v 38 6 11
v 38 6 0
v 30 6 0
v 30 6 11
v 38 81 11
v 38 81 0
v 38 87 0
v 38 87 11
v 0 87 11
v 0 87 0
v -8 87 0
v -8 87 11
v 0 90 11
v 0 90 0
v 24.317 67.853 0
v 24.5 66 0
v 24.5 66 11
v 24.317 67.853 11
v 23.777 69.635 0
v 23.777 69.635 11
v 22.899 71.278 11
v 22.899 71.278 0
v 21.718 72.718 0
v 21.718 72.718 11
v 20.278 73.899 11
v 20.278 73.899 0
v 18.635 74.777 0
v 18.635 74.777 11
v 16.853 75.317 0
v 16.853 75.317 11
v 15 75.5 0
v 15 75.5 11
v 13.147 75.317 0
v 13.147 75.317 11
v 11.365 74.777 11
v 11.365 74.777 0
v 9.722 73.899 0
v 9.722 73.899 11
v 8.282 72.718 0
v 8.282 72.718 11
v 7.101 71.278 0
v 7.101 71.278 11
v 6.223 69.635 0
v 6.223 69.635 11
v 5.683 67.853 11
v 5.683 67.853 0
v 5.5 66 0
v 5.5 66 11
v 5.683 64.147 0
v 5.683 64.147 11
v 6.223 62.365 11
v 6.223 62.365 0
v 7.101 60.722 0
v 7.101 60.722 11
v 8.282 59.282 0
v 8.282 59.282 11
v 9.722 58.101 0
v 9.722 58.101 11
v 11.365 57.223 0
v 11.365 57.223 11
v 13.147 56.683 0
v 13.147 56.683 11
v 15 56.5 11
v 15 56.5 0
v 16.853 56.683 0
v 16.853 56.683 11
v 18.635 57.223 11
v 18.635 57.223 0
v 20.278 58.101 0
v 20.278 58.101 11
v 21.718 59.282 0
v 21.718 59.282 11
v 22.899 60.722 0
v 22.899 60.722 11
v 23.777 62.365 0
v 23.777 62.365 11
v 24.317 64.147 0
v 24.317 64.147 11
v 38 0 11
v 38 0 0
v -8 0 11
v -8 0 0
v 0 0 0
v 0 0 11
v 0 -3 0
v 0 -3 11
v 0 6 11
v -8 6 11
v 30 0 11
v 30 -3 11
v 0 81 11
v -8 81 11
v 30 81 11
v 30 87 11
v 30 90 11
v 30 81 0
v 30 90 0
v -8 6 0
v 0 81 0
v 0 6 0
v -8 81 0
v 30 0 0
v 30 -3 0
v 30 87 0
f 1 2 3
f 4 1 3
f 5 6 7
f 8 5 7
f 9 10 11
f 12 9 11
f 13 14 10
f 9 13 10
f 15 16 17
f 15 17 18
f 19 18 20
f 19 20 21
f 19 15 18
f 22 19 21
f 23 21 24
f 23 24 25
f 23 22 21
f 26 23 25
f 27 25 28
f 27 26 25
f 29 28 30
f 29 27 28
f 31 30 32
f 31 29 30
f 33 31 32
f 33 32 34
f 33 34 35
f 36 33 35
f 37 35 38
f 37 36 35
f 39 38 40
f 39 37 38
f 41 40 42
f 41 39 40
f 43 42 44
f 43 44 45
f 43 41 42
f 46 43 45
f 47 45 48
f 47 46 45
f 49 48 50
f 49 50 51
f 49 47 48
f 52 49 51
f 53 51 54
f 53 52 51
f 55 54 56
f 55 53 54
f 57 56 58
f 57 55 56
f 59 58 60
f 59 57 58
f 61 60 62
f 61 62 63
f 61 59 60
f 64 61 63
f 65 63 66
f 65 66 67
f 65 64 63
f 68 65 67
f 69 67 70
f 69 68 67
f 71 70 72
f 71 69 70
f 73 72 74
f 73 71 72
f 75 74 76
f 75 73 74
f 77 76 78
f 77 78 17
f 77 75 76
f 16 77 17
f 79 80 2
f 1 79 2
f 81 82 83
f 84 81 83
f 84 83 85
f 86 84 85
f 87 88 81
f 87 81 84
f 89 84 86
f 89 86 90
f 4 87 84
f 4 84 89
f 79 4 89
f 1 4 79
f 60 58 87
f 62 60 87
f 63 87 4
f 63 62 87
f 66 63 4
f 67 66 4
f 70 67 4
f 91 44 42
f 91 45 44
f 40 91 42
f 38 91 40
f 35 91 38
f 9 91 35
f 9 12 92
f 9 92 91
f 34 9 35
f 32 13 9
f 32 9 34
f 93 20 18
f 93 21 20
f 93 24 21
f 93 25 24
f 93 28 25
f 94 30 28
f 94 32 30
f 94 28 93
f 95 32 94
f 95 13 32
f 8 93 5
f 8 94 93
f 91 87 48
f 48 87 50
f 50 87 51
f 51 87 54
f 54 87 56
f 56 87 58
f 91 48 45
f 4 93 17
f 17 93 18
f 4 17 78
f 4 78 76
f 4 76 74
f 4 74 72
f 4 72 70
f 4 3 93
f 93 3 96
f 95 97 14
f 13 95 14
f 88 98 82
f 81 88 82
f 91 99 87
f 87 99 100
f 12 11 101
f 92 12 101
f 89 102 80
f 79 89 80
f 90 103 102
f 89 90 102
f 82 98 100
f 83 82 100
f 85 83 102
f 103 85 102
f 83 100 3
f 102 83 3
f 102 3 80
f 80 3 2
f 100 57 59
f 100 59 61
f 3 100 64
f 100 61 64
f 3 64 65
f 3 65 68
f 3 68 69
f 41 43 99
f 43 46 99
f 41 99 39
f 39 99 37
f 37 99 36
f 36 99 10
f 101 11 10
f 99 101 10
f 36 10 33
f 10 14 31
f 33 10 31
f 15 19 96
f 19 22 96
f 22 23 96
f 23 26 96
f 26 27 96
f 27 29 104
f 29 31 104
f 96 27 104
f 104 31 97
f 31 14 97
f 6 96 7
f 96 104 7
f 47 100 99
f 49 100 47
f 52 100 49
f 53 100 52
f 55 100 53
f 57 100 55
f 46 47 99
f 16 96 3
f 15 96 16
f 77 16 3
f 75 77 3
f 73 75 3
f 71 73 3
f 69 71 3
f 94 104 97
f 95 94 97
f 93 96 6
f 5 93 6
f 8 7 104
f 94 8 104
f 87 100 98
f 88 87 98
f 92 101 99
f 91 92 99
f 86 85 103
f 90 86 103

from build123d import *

# Parameters (mm, degrees)
ESQUISSE1_R        = 9.5
BOSS_EXTRU_1_DEPTH = 11


with BuildPart() as part:
    # Esquisse1 → Boss.-Extru.1 (new body)
    with BuildSketch(Plane.XY):
        Polygon((0, 81), (0, 6), (-8, 6), (-8, 0), (0, 0), (0, -3), (30, -3), (30, 0), (38, 0), (38, 6), (30, 6), (30, 81), (38, 81), (38, 87), (30, 87), (30, 90), (25, 90), (5, 90), (0, 90), (0, 87), (-8, 87), (-8, 81), align=None)
        with Locations((15, 66)):
            Circle(ESQUISSE1_R, mode=Mode.SUBTRACT)
    extrude(amount=BOSS_EXTRU_1_DEPTH)


solid = part.part
